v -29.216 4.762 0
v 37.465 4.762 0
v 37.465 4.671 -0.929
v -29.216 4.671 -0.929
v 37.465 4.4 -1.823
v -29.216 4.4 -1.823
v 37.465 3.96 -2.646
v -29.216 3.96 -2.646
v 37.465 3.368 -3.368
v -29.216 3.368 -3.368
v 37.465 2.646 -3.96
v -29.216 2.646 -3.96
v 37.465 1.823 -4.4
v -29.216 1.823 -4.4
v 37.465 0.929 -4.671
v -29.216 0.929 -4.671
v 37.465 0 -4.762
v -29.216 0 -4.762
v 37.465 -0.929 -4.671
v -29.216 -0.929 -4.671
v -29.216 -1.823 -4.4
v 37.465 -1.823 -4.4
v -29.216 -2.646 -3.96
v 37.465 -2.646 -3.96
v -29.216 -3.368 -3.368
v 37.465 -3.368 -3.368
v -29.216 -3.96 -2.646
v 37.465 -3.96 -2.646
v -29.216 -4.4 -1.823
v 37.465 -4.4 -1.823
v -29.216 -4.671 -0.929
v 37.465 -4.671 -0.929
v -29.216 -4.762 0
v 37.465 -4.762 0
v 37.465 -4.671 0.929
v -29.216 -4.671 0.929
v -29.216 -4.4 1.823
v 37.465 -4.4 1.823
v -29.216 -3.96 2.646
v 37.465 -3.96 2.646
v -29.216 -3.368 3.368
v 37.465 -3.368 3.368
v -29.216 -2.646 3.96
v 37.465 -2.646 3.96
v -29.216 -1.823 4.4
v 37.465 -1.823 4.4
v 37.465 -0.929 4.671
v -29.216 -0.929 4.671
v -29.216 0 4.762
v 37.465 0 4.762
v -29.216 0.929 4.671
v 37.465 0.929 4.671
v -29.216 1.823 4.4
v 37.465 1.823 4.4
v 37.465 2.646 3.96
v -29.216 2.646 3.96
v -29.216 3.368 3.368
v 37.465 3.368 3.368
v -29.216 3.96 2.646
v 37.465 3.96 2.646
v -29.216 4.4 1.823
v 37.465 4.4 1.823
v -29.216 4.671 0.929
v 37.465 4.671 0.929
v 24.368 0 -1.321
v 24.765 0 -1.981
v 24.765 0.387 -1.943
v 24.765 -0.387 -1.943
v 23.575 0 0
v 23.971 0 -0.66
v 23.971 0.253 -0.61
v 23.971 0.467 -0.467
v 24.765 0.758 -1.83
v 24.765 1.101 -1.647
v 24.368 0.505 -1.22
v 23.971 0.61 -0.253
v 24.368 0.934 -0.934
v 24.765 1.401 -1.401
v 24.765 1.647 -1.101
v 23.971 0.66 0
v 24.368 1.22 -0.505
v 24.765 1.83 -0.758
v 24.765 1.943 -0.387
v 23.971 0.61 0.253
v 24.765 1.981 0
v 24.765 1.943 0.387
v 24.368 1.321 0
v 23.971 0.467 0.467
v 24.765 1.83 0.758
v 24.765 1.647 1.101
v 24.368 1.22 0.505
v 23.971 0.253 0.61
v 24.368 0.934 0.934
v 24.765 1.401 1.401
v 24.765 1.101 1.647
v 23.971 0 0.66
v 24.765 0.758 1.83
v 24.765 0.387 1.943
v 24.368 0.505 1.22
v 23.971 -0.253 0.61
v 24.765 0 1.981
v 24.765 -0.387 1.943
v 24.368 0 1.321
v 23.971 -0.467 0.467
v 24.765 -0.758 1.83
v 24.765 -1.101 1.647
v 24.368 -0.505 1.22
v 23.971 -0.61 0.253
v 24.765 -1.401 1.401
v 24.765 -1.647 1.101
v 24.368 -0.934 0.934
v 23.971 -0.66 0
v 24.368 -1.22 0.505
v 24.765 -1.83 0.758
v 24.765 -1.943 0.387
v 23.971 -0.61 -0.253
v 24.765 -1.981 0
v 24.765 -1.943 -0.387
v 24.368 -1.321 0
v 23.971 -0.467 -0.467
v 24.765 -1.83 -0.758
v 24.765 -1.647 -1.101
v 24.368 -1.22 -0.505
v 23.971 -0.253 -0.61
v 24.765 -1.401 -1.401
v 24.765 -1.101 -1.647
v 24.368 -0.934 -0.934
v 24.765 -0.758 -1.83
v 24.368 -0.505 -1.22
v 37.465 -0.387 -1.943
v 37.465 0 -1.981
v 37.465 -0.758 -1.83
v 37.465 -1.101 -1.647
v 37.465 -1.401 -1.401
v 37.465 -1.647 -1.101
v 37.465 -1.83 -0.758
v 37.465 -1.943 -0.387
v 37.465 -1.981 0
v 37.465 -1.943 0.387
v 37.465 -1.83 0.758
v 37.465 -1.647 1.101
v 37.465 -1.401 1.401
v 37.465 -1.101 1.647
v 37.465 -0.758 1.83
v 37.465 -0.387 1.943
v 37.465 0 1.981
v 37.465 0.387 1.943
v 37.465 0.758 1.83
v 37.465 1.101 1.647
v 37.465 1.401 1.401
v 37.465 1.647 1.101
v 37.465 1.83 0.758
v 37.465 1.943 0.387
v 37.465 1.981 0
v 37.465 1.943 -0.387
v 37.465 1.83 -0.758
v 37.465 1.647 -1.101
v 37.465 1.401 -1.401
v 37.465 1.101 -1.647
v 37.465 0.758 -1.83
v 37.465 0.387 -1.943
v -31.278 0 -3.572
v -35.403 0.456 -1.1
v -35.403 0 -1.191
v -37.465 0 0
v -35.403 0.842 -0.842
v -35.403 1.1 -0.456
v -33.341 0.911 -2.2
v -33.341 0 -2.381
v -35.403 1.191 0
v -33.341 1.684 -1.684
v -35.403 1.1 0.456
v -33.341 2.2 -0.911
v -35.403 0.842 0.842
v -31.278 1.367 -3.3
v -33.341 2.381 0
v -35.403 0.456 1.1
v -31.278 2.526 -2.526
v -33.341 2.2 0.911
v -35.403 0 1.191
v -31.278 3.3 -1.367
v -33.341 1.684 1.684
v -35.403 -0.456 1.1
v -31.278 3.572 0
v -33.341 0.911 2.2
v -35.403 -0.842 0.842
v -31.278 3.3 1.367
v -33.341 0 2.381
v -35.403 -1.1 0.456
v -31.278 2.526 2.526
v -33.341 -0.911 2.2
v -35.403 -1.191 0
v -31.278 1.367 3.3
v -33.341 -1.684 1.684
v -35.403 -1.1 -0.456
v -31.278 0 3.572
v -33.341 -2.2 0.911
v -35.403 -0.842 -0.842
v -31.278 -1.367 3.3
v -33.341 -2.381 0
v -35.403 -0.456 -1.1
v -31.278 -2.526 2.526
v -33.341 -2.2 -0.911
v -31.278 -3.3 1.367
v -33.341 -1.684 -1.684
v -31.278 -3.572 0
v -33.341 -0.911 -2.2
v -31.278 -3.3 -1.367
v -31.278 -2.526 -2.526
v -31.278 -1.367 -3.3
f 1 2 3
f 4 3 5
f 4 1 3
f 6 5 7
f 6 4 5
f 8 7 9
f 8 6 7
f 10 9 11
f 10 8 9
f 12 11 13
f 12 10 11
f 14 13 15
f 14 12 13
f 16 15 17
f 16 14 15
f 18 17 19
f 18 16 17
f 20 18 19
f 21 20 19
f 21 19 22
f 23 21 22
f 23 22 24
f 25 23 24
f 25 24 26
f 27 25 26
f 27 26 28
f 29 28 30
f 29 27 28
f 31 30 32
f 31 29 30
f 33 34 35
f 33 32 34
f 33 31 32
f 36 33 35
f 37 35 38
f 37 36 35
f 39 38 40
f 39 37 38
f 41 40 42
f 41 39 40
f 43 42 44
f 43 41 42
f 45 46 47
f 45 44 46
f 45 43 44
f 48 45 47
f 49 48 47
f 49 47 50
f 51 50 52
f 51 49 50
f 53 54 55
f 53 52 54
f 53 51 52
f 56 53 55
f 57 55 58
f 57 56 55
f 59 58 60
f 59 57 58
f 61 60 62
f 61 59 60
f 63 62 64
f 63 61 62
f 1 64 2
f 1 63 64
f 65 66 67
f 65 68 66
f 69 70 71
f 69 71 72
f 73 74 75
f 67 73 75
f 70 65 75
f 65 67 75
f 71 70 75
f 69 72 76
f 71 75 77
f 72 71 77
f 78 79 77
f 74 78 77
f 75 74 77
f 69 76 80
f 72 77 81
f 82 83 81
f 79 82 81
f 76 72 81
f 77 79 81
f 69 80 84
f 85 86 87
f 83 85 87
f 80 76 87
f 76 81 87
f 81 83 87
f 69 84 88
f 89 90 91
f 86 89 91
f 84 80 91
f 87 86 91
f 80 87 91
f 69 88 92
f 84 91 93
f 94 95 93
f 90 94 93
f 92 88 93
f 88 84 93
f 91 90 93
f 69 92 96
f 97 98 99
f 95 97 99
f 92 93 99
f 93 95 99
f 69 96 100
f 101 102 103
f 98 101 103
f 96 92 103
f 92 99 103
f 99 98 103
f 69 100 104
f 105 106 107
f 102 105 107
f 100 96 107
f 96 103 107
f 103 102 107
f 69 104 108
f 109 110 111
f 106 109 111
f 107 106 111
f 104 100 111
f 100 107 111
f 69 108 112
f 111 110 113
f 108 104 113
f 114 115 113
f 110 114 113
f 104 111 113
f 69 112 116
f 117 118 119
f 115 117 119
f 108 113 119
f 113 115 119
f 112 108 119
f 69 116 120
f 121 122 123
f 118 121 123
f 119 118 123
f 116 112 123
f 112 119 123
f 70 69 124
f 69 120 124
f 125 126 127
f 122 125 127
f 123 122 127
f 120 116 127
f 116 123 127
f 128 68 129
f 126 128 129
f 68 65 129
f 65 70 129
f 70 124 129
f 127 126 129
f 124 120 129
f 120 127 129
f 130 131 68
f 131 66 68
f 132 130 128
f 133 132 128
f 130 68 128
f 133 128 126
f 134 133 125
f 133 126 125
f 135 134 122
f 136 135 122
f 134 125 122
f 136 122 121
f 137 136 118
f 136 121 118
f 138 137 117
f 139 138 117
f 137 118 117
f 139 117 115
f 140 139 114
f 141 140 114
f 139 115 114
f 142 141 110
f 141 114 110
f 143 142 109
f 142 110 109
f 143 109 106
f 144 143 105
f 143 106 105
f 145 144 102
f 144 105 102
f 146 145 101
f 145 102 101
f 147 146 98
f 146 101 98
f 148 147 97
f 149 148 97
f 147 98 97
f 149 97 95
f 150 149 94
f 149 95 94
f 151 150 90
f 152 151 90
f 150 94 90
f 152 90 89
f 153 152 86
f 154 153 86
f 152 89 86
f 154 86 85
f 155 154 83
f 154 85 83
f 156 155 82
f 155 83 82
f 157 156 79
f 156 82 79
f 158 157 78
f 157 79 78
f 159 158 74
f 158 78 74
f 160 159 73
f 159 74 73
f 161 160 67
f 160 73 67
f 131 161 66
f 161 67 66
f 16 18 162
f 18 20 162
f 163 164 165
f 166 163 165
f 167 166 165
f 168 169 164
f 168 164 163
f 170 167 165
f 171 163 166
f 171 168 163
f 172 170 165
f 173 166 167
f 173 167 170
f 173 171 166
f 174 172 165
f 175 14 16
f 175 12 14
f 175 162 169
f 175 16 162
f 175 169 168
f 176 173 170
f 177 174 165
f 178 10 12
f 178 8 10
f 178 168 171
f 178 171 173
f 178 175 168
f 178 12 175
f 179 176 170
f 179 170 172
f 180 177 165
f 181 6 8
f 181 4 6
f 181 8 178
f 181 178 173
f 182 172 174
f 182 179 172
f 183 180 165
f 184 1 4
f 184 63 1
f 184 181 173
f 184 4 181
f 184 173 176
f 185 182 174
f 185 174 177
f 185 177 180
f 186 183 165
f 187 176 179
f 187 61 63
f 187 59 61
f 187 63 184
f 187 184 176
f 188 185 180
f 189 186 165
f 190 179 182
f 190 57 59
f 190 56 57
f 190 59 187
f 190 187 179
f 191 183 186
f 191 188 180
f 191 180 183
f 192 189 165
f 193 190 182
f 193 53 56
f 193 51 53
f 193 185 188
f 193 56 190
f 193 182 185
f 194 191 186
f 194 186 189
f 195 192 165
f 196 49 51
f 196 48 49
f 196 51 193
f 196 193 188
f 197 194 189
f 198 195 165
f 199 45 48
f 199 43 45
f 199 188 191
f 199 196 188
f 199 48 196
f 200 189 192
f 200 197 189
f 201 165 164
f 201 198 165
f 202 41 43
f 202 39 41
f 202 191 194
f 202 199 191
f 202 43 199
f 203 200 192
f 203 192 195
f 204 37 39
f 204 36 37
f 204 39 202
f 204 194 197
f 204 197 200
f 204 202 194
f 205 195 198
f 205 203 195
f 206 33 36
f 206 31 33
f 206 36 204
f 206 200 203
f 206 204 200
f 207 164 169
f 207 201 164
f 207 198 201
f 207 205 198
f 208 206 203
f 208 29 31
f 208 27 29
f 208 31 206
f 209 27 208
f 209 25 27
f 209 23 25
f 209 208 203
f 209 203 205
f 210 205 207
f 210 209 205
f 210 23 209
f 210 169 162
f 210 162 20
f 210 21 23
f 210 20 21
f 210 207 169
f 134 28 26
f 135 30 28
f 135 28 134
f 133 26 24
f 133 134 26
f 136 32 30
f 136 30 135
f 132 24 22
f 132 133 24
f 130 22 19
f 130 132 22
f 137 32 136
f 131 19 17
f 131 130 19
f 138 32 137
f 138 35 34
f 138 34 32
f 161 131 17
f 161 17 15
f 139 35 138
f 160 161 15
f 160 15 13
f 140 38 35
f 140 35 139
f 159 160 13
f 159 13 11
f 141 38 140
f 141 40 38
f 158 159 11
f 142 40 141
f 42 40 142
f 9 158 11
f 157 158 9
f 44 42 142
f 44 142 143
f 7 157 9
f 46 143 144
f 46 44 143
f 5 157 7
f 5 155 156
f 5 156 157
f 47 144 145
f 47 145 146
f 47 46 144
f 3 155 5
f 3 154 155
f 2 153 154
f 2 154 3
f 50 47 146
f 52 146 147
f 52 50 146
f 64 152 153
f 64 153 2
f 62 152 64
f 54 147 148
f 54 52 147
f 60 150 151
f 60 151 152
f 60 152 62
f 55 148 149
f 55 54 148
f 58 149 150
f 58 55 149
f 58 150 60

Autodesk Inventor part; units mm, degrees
ref_plane "YZ Plane" through (0, 0, 0) normal (1, 0, 0) x (0, 1, 0)
ref_plane "XZ Plane" through (0, 0, 0) normal (0, 1, 0) x (-1, 0, 0)
ref_plane "XY Plane" through (0, 0, 0) normal (0, 0, 1) x (1, 0, 0)
sketch "Sketch1" plane through (0, 0, 0) normal (1, 0, 0) x (0, 1, 0)
  circle A0 centre (0, 0) radius 4.7625
  dimension "d0" = 9.525
extrude "Extrusion1" add sketch "Sketch1" along normal mid plane 74.93
sketch "Sketch2" plane through (0, 0, 0) normal (0, 1, 0) x (-1, 0, 0)
  line L0 (37.465, -4.7625) -> (37.465, 4.7625) projected
  line L1 (37.465, 0) -> (29.2161, -4.7625)
  line L2 (37.465, -4.7625) -> (-37.465, -4.7625) projected
  line L3 (37.465, -4.7625) -> (37.465, 0)
  line L4 (50.2285, 0) -> (-50.2285, 0) projected
  point P0 (0, 0)
  dimension "d3" = 60
  dimension "d5" = 8.2489
revolve "Revolution1" cut sketch "Sketch2" angle 360 about axis through (-10, 0, 0) along (1, 0, 0)
sketch "Sketch3" plane through (37.465, 0, 0) normal (1, 0, 0) x (0, 0, -1)
  point P0 (0, 0)
  point P1 (0, 0)
hole "Hole1" at (37.465, 0, 0) direction (-1, 0, 0) diameter 3.9624 depth 12.7 tip angle 118 thread size "10-32 UNF" class "2B" standard "ANSI Unified Screw Threads"
equation "\"d0\" = diam"
equation "\"d1\" = length"
equation "\"diam\" = 9.525"
equation "\"nosePiece_drivenDimesion\" = 8.255"
equation "\"spacerFromOuterTube\" = 3.175"
equation "\"length\" = 74.93"
properties part number "outerTubeStopPost" material "Steel"
